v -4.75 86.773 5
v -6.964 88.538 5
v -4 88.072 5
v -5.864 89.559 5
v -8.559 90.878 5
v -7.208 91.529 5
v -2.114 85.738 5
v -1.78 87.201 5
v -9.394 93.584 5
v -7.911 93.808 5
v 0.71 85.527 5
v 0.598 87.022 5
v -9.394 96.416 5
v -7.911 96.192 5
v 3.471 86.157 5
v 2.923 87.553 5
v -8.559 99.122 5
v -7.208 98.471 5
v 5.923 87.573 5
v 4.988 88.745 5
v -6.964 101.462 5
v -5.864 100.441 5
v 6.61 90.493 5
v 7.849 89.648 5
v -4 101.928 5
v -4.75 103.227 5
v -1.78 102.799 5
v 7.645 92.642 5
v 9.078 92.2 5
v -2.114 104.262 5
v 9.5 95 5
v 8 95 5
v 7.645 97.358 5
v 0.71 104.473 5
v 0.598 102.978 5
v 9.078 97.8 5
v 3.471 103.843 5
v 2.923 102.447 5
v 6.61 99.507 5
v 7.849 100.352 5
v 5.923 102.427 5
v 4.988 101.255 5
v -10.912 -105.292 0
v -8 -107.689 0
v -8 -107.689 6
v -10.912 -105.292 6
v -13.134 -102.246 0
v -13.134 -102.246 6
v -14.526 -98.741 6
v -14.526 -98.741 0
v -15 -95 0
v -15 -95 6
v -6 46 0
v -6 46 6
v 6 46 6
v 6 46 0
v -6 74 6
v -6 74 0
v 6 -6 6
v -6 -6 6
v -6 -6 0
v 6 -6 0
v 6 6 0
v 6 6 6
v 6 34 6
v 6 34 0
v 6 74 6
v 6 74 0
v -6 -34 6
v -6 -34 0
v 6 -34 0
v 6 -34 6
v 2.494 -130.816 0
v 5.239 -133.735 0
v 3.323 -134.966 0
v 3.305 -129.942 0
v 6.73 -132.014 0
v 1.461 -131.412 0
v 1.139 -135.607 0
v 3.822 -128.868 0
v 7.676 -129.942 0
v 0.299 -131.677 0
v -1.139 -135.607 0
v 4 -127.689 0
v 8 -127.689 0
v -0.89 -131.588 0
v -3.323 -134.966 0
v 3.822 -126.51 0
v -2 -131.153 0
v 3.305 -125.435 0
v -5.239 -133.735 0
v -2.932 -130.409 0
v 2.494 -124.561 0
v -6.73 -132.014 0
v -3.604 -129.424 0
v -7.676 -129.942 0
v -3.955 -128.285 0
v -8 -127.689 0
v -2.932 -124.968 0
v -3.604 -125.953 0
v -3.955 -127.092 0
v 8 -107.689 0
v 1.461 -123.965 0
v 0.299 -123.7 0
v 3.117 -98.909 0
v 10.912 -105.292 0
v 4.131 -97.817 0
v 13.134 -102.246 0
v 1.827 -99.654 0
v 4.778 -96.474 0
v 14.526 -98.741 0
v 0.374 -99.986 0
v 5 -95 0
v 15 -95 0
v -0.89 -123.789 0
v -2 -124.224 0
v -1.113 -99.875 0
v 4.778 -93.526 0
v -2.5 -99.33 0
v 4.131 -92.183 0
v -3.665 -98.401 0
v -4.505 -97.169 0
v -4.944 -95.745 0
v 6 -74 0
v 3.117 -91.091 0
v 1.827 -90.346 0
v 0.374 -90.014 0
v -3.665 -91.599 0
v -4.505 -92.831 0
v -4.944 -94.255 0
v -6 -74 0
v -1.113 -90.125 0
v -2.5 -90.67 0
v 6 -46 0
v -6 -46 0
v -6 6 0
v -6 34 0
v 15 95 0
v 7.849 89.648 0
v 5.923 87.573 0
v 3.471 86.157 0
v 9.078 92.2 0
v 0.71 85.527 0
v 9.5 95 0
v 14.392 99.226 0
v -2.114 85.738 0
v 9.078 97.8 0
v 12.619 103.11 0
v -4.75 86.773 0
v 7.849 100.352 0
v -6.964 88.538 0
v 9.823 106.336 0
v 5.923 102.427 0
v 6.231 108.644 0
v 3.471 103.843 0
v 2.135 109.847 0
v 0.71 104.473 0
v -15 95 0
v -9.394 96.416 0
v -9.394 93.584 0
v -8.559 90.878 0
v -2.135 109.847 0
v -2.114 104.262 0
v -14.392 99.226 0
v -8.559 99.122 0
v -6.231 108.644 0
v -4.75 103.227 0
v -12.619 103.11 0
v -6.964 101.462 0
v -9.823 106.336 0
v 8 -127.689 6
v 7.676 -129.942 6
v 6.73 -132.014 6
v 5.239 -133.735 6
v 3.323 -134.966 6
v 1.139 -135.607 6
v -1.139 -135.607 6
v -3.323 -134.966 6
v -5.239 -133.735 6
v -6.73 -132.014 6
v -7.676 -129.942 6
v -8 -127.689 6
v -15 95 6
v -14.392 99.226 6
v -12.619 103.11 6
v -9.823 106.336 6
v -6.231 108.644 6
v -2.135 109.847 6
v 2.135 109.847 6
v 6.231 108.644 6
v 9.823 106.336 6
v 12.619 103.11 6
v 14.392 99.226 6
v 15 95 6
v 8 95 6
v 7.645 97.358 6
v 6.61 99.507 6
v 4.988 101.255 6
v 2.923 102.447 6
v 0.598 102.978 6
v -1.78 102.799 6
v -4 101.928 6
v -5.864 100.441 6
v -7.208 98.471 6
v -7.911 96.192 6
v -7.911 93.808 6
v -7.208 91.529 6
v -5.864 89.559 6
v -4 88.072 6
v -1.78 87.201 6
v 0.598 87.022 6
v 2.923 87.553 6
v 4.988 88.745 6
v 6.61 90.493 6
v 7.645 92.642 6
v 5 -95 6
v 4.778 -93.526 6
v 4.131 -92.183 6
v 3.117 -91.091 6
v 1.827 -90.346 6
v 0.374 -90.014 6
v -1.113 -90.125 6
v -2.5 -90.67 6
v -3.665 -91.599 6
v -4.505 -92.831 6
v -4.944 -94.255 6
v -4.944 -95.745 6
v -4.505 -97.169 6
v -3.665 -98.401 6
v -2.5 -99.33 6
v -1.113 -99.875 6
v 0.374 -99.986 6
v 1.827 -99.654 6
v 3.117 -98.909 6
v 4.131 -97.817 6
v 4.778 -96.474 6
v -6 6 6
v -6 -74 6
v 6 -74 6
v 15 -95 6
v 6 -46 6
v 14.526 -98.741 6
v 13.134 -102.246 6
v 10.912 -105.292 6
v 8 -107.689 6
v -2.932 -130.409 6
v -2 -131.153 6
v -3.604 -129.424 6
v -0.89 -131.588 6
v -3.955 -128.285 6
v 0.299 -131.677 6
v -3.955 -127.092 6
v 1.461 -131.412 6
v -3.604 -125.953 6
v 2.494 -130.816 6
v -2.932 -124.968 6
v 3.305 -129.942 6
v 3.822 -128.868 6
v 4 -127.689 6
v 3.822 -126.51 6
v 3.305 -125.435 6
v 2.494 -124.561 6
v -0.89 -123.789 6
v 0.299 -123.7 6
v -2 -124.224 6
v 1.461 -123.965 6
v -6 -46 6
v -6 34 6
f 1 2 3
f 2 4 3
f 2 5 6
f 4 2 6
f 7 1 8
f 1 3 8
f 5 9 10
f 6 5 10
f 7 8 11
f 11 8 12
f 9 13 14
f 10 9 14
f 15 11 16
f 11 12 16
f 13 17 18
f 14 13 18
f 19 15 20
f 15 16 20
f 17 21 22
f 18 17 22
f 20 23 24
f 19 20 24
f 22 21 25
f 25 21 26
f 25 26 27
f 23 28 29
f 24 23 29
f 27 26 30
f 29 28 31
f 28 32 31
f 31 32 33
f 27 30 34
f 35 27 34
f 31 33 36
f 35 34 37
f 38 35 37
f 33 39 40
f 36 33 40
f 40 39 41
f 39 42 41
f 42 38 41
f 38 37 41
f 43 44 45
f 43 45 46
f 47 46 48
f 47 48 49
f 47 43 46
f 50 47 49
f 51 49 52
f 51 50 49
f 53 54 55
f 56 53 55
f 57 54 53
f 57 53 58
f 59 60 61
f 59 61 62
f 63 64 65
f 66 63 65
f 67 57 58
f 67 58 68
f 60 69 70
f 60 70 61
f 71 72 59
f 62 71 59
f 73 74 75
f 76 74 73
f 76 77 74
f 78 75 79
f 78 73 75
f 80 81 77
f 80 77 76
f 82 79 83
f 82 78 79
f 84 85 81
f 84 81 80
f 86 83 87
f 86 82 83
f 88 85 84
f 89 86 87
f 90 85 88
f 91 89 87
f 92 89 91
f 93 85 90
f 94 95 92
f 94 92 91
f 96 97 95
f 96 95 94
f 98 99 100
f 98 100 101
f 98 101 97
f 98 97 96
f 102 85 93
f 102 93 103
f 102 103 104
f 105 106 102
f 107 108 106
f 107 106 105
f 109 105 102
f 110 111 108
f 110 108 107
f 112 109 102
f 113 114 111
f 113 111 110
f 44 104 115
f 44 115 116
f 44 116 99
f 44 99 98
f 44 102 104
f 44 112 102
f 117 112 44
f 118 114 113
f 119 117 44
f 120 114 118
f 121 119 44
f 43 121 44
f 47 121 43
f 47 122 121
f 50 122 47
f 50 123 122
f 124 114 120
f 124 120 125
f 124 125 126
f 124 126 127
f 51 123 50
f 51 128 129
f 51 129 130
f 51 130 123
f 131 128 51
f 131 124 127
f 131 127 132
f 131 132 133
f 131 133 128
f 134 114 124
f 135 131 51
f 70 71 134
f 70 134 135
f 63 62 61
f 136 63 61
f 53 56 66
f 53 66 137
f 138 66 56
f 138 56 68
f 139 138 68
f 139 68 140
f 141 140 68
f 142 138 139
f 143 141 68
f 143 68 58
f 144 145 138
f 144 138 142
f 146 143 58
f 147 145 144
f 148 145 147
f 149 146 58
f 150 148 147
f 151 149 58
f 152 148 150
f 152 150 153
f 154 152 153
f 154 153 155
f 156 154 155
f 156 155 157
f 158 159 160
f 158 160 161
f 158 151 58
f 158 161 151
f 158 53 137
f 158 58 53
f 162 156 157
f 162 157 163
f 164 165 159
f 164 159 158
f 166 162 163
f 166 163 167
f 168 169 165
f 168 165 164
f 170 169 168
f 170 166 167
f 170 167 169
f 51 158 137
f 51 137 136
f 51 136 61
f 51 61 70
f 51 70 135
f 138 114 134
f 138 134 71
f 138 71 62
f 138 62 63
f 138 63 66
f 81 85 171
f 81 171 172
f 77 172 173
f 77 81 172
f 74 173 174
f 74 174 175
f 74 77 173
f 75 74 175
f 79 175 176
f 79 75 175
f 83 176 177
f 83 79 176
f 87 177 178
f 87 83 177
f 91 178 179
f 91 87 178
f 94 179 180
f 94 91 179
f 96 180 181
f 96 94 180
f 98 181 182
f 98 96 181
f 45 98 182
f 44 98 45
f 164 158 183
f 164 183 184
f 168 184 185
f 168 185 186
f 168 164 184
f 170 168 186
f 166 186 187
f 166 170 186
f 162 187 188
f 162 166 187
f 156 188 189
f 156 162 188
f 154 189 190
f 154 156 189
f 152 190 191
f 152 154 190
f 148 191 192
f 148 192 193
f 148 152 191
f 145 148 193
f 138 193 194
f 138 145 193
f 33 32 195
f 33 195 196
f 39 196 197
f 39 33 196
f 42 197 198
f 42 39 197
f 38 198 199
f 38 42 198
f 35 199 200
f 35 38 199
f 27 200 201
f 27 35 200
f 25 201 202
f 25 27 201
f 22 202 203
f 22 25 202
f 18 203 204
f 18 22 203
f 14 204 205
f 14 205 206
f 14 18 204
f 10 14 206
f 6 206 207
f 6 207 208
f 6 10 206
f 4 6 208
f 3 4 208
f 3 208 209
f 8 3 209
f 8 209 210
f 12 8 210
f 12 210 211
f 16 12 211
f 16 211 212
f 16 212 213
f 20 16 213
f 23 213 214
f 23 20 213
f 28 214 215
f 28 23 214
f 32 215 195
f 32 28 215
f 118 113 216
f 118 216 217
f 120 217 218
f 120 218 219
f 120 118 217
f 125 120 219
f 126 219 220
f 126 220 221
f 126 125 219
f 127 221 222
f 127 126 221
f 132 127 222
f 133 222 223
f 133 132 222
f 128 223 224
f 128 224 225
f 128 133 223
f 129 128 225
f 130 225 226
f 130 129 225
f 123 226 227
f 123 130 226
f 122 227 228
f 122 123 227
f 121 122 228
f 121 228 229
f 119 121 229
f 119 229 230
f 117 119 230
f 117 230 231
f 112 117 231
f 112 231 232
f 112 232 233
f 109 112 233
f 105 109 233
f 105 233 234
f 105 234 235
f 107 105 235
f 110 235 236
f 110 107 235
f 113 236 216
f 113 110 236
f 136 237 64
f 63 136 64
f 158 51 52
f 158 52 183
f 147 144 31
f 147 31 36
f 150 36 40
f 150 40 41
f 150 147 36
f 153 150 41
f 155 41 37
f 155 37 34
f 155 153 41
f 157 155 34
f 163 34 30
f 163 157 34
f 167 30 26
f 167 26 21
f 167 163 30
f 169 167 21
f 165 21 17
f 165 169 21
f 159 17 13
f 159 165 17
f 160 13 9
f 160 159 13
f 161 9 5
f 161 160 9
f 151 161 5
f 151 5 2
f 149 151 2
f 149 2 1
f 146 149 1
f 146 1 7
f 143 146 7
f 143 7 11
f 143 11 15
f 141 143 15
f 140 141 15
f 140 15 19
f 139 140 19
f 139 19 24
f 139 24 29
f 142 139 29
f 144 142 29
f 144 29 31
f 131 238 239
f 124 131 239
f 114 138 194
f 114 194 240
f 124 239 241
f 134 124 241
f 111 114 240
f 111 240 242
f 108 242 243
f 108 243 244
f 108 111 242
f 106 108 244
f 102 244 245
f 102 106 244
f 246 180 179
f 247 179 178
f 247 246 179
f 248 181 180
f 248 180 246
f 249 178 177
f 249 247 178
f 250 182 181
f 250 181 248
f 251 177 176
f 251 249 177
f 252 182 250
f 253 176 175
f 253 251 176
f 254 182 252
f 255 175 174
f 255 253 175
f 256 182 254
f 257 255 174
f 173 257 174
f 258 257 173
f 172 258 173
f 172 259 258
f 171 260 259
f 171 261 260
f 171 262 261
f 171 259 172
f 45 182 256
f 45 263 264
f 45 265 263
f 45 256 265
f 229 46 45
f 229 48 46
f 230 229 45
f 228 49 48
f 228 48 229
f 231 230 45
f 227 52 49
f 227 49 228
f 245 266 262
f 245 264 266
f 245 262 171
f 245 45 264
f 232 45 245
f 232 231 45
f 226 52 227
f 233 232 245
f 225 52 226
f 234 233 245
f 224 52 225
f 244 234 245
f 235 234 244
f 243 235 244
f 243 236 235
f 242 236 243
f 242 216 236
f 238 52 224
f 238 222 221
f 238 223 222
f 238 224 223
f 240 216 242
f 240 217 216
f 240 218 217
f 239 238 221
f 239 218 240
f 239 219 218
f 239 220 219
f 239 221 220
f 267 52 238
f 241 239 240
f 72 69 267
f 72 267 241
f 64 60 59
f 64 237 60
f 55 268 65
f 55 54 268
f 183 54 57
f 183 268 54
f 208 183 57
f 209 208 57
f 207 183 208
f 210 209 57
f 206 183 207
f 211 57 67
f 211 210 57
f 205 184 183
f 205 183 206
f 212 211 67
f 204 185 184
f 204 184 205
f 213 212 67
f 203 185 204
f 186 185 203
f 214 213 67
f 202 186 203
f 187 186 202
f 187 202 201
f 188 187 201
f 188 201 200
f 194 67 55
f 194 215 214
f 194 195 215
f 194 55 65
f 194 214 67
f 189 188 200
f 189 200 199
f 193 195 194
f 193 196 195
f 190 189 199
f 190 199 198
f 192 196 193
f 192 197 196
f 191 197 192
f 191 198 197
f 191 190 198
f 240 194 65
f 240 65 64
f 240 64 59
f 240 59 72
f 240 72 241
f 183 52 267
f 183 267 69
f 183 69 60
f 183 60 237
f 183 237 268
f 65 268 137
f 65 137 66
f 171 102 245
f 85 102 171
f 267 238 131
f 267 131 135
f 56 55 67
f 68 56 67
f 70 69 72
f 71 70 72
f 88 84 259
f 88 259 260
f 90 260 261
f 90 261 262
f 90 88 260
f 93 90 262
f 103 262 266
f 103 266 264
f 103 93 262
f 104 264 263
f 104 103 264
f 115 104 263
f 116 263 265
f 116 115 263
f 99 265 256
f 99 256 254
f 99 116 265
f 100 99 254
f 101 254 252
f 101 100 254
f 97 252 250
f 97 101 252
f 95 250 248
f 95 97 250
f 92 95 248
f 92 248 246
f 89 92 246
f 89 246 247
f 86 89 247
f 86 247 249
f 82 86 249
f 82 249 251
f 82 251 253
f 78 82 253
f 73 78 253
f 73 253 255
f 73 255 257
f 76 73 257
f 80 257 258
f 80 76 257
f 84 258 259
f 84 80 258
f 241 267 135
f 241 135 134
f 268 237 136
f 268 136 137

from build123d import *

# Parameters (mm, degrees)
SKETCH_1_R          = 9.5
SKETCH_1_R_2        = 5
SKETCH_1_R_3        = 4
EXTRUDE_2_DEPTH     = 6
SKETCH_2_W          = 12
SKETCH_2_H          = 28
CUT_EXTRUDE_1_DEPTH = 6
EXTRUDE_START       = -1
SKETCH_4_R          = 9.5
SKETCH_4_R_2        = 8
EXTRUDE_4_DEPTH     = 1


with BuildPart() as part:
    # 草图1 → 凸台-拉伸2 (new body)
    with BuildSketch(Plane.XY):
        with BuildLine():
            Line((-8, -127.68857754), (-8, -107.68857754))
            ThreePointArc((-8, -107.68857754), (-13.133925537, -102.245688373), (-15, -95))
            Line((-15, -95), (-15, 95))
            ThreePointArc((-15, 95), (0, 110), (15, 95))
            Line((15, 95), (15, -95))
            ThreePointArc((15, -95), (13.133925537, -102.245688373), (8, -107.68857754))
            Line((8, -107.68857754), (8, -127.68857754))
            ThreePointArc((8, -127.68857754), (0, -135.68857754), (-8, -127.68857754))
        make_face()
        with Locations((0, 95)):
            Circle(SKETCH_1_R, mode=Mode.SUBTRACT)
        with Locations((0, -95)):
            Circle(SKETCH_1_R_2, mode=Mode.SUBTRACT)
        with Locations((0, -127.68857754)):
            Circle(SKETCH_1_R_3, mode=Mode.SUBTRACT)
    extrude(amount=EXTRUDE_2_DEPTH)

    # 草图2 → 切除-拉伸1 (cut)
    with BuildSketch(Plane.XY.offset(6)):
        with Locations((0, 60)):
            Rectangle(SKETCH_2_W, SKETCH_2_H)
        with Locations((0, 20)):
            Rectangle(SKETCH_2_W, SKETCH_2_H)
        with Locations((0, -20)):
            Rectangle(SKETCH_2_W, SKETCH_2_H)
        with Locations((0, -60)):
            Rectangle(SKETCH_2_W, SKETCH_2_H)
    extrude(amount=-CUT_EXTRUDE_1_DEPTH, mode=Mode.SUBTRACT)

    # 草图4 → 凸台-拉伸4 (add)
    with BuildSketch(Plane.XY.offset(6).offset(EXTRUDE_START)):
        with Locations((0, 95)):
            Circle(SKETCH_4_R)
        with Locations((0, 95)):
            Circle(SKETCH_4_R_2, mode=Mode.SUBTRACT)
    extrude(amount=EXTRUDE_4_DEPTH)


solid = part.part
